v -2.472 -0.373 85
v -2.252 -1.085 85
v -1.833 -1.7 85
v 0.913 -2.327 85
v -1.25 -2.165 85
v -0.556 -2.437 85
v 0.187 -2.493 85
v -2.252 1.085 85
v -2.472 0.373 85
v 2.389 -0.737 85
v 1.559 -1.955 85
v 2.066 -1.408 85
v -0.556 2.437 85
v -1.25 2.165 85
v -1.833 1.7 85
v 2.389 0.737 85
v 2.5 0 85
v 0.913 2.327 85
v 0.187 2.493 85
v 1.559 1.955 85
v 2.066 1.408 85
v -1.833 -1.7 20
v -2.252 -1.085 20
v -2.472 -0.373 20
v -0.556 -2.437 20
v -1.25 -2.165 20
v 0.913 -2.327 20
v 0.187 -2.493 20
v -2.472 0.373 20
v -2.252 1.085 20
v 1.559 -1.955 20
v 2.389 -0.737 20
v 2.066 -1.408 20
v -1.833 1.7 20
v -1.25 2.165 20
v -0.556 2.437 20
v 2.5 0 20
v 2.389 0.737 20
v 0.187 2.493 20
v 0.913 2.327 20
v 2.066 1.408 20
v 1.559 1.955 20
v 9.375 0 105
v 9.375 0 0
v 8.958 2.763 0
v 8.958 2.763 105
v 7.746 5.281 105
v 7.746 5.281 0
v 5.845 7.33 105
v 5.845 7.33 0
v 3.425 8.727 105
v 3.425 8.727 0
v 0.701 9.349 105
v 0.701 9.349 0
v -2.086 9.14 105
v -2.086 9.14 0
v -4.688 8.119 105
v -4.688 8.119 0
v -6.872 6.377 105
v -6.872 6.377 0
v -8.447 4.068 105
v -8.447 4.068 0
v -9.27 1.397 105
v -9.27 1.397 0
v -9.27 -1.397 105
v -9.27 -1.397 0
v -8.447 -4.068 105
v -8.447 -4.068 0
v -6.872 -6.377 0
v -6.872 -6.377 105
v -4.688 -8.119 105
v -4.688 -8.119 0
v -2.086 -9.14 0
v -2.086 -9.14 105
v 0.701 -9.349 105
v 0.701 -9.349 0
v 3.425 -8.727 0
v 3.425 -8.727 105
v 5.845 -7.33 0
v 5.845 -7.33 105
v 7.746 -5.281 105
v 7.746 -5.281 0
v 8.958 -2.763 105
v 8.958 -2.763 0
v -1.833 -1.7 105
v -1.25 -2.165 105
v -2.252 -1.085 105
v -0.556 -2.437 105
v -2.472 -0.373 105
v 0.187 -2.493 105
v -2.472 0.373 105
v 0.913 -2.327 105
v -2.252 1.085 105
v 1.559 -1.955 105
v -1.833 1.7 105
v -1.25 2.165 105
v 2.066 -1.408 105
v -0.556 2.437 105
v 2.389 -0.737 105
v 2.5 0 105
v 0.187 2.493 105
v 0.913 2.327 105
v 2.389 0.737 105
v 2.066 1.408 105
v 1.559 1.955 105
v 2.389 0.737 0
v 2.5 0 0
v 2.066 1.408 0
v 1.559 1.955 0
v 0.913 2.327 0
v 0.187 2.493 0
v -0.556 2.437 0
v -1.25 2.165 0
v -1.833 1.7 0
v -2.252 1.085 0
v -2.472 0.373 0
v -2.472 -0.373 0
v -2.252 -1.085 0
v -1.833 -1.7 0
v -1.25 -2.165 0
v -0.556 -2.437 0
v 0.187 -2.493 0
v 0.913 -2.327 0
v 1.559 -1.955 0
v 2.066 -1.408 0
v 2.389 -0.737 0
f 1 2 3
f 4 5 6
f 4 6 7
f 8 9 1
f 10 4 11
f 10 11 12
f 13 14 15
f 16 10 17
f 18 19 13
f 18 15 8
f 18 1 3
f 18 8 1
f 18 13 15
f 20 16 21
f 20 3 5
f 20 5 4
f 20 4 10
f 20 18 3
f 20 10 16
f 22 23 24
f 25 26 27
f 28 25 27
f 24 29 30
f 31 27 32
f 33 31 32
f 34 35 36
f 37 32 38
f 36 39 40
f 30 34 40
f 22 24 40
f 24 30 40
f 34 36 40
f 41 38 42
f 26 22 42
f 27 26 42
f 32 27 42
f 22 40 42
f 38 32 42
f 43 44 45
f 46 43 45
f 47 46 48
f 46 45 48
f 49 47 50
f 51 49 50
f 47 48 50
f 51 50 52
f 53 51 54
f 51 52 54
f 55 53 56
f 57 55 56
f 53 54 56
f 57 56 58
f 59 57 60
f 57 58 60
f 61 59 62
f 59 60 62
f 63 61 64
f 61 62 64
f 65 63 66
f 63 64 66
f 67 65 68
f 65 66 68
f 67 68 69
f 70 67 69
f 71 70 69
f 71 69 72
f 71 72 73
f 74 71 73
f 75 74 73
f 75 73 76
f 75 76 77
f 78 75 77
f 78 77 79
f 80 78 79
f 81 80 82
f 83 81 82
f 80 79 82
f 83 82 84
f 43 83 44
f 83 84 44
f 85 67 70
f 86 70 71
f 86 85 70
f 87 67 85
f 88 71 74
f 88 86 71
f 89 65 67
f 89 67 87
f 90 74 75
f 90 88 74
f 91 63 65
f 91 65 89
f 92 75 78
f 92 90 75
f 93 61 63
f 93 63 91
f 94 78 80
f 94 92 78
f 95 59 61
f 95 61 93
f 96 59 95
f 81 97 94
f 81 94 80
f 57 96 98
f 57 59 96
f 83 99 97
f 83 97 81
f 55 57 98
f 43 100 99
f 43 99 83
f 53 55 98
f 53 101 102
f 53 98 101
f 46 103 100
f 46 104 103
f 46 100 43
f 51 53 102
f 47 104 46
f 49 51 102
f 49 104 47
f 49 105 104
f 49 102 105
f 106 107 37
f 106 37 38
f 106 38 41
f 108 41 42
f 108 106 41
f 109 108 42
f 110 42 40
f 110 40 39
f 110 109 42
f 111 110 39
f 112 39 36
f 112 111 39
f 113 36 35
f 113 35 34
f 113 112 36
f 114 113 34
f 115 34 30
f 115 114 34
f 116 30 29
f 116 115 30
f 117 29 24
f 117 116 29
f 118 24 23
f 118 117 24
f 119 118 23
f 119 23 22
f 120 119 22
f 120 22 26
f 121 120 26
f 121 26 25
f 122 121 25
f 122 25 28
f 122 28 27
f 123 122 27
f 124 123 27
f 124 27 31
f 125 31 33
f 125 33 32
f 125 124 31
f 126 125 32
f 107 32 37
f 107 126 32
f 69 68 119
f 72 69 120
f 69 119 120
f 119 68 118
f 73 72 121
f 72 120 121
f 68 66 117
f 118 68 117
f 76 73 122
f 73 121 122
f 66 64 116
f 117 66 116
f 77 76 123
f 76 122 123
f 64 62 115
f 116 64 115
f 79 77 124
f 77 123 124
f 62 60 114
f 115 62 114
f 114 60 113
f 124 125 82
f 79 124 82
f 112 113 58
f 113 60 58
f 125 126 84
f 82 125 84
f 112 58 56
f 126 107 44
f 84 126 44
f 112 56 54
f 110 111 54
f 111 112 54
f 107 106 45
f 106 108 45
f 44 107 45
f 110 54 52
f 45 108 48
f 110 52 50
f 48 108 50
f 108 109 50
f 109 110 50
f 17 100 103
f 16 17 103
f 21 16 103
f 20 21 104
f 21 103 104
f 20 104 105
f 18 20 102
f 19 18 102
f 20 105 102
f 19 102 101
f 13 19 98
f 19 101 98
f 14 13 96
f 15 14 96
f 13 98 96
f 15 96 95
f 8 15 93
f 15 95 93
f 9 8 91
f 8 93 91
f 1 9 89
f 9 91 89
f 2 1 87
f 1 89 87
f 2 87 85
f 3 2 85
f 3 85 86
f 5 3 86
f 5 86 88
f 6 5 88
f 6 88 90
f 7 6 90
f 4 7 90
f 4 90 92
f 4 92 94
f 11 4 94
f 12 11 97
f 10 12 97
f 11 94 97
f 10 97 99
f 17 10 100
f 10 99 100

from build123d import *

# Parameters (mm, degrees)
SKETCH1_R           = 9.375
BOSS_EXTRUDE1_DEPTH = 105
SKETCH4_R           = 2.5
CUT_EXTRUDE1_DEPTH  = 20


with BuildPart() as part:
    # Sketch1 → Boss-Extrude1 (new body)
    with BuildSketch(Plane.XY):
        Circle(SKETCH1_R)
    extrude(amount=BOSS_EXTRUDE1_DEPTH)

    # Sketch4 → Cut-Extrude1 (cut)
    with BuildSketch(Plane.XY.offset(105)):
        Circle(SKETCH4_R)
    cut_extrude1 = extrude(amount=-CUT_EXTRUDE1_DEPTH, mode=Mode.SUBTRACT)

    # Mirror1: Cut-Extrude1 across plane
    add(cut_extrude1.mirror(Plane(origin=(0, 0, 52.5), x_dir=(1, 0, 0), z_dir=(0, 0, -1))), mode=Mode.SUBTRACT)


solid = part.part
